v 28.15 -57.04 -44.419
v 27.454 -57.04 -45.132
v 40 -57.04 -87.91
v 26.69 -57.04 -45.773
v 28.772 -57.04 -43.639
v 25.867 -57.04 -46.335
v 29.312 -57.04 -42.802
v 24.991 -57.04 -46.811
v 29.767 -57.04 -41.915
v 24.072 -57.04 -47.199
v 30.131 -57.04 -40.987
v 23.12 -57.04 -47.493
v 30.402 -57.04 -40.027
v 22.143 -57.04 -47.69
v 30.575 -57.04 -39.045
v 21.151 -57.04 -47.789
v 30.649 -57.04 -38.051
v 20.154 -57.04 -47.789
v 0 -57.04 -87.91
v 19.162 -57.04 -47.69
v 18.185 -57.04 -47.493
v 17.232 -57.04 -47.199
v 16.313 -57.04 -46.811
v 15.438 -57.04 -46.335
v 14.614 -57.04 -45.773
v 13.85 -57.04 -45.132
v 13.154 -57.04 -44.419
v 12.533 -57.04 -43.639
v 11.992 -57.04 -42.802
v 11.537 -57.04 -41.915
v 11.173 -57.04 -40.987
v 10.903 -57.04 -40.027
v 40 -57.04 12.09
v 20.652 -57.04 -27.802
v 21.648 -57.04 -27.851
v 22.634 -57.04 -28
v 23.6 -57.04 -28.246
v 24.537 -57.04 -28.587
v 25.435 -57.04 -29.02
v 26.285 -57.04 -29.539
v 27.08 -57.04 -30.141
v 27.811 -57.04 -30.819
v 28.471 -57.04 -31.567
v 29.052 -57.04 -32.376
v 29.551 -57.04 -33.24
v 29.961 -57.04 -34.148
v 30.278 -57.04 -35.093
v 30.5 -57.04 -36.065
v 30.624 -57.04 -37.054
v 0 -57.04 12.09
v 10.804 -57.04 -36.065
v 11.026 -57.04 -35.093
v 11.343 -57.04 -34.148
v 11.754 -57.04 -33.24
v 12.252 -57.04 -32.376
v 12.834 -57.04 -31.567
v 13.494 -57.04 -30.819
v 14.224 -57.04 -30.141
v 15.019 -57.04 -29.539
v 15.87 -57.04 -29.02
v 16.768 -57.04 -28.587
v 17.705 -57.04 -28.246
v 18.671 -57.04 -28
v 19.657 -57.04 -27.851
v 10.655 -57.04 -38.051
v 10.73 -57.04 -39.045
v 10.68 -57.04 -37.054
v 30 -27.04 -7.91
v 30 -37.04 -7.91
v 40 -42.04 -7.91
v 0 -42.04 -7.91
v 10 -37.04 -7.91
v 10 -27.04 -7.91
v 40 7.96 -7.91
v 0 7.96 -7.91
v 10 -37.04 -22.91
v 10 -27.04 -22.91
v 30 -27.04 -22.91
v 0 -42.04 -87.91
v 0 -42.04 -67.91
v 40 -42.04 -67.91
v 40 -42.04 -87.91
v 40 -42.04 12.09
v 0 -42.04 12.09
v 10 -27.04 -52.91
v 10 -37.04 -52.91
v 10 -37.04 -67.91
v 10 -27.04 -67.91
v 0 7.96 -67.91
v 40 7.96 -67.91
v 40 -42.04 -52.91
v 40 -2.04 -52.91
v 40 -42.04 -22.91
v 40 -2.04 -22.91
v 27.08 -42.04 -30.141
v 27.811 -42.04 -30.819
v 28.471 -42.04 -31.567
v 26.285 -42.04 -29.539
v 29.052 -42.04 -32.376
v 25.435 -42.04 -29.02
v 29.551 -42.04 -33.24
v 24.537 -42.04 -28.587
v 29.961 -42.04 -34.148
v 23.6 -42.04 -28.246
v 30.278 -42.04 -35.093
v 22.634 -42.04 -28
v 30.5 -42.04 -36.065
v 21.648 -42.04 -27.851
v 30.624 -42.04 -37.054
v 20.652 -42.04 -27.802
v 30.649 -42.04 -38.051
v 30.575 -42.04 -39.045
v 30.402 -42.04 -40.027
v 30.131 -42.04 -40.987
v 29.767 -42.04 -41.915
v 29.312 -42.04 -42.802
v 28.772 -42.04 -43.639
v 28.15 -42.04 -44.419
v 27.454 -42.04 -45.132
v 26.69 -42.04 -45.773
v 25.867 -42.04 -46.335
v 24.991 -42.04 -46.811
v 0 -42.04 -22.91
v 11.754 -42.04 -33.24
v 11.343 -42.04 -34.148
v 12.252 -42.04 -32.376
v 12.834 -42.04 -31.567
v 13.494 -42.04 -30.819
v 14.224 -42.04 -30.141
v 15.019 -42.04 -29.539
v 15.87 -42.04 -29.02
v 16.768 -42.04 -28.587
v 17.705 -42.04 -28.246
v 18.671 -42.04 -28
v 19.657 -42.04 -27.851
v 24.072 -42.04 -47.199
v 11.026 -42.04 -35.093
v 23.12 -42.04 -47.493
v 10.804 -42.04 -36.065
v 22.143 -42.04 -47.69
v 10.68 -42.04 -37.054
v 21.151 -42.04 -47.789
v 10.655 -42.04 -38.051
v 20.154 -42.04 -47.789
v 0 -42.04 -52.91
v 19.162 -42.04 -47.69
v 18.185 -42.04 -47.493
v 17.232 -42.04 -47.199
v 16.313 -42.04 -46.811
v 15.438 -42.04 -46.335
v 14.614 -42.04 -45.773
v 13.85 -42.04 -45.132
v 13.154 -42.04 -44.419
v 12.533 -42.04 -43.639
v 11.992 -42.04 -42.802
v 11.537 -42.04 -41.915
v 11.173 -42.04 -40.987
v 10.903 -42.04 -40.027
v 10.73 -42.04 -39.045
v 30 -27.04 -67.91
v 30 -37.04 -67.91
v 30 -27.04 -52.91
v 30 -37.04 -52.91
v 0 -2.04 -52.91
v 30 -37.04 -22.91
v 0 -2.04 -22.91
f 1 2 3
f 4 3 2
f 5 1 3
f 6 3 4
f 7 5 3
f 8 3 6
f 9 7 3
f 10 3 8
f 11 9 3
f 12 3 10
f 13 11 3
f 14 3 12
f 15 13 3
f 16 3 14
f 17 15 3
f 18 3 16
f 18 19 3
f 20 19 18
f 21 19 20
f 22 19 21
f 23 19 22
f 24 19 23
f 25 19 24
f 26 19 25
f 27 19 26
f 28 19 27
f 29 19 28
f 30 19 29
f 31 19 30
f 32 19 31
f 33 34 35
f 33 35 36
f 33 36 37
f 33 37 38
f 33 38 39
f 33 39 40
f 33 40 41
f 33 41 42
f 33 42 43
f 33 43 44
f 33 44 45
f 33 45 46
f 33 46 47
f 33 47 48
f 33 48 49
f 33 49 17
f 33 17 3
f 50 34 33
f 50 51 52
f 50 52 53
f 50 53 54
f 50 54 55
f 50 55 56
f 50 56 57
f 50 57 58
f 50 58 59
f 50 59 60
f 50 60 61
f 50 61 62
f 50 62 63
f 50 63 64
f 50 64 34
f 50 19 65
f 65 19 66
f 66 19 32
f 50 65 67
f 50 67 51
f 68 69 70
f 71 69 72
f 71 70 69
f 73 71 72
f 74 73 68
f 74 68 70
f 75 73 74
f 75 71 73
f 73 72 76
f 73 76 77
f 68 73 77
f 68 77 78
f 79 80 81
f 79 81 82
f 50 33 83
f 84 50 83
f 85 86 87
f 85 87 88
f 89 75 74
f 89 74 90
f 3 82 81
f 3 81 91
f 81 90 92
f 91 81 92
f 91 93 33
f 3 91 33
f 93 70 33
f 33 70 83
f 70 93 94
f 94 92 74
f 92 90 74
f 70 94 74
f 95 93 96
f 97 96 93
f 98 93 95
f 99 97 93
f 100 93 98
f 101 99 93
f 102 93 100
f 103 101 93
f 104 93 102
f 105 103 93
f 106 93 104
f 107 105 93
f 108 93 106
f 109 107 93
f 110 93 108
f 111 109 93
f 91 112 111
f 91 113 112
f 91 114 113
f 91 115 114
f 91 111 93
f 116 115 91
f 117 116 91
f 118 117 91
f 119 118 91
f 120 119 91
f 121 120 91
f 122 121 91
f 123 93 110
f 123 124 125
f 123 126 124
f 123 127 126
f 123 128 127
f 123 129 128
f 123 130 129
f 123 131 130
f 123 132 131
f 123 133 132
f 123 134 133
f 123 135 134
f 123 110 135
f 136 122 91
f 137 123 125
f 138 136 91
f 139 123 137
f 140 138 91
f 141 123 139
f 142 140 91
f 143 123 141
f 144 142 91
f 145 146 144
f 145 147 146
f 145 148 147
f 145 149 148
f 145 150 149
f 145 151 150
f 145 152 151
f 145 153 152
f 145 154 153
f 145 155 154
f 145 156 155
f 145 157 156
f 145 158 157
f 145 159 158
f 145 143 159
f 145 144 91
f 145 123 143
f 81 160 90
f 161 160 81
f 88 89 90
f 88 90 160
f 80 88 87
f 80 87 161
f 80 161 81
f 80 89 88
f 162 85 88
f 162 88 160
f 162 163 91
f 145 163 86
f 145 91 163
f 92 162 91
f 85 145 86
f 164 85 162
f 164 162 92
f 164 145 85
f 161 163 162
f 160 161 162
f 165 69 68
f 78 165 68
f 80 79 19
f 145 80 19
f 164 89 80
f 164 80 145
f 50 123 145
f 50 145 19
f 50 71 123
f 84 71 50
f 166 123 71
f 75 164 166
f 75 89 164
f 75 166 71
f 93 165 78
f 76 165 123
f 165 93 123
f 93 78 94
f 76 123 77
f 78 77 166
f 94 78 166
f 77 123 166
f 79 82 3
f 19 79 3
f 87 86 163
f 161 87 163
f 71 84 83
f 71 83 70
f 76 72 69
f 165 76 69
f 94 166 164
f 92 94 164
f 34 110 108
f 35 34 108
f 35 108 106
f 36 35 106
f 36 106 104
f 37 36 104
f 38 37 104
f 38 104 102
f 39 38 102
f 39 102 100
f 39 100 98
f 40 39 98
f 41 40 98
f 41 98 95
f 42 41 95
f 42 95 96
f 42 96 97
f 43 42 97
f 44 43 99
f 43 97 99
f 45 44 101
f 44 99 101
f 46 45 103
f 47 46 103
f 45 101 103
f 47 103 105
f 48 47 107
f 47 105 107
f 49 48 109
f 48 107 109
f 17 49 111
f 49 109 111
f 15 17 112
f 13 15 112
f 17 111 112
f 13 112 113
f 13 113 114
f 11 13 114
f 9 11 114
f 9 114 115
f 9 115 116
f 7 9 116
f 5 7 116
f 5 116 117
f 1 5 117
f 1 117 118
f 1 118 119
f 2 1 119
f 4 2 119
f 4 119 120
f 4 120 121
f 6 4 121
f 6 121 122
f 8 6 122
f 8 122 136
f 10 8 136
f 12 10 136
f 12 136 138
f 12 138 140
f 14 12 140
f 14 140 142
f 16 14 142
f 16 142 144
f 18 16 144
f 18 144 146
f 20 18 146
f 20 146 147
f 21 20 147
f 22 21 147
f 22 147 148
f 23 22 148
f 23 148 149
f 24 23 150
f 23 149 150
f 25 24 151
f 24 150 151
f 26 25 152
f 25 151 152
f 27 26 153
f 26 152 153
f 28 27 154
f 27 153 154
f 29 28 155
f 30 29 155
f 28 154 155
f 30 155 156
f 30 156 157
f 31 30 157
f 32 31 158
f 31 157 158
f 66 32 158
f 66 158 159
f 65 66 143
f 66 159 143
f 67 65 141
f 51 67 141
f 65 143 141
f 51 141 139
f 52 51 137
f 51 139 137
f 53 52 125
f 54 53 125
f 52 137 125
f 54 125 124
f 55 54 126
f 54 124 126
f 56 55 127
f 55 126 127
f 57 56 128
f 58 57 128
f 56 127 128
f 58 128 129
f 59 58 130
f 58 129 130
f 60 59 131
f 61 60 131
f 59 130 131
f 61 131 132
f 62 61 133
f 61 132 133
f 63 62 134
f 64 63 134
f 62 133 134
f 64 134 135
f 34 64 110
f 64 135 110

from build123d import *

# Parameters (mm, degrees)
SKETCH1_W           = 30
SKETCH1_H           = 40
BOSS_EXTRUDE1_DEPTH = 40
SKETCH2_W           = 20
SKETCH2_H           = 10
CUT_EXTRUDE1_DEPTH  = 107.082782983
SKETCH3_R           = 10
CUT_EXTRUDE2_DEPTH  = 109.757771635


with BuildPart() as part:
    # Sketch1 → Boss-Extrude1 (new body)
    with BuildSketch(Plane(origin=(0, 0, 0), x_dir=(0, 0, -1), z_dir=(1, 0, 0))):
        Polygon((-12.089517741, -57.039958323), (-12.089517741, -42.039958323), (7.910482259, -42.039958323), (7.910482259, 7.960041677), (67.910482259, 7.960041677), (67.910482259, -42.039958323), (87.910482259, -42.039958323), (87.910482259, -57.039958323), align=None)
        with Locations((37.910482259, -22.039958323)):
            Rectangle(SKETCH1_W, SKETCH1_H, mode=Mode.SUBTRACT)
    extrude(amount=BOSS_EXTRUDE1_DEPTH)

    # Sketch2 → Cut-Extrude1 (cut, through all)
    with BuildSketch(Plane.XY.offset(-7.910482259)):
        with Locations((20, -32.039958323)):
            Rectangle(SKETCH2_W, SKETCH2_H)
    extrude(amount=-CUT_EXTRUDE1_DEPTH, mode=Mode.SUBTRACT)

    # Sketch3 → Cut-Extrude2 (cut, through all)
    with BuildSketch(Plane(origin=(0, -42.039958323, 0), x_dir=(1, 0, 0), z_dir=(0, 1, 0))):
        with Locations(Location((20.652222237, 37.801778553, 0), (0, 0, 270))):
            Circle(SKETCH3_R)
    extrude(amount=-CUT_EXTRUDE2_DEPTH, mode=Mode.SUBTRACT)


solid = part.part
